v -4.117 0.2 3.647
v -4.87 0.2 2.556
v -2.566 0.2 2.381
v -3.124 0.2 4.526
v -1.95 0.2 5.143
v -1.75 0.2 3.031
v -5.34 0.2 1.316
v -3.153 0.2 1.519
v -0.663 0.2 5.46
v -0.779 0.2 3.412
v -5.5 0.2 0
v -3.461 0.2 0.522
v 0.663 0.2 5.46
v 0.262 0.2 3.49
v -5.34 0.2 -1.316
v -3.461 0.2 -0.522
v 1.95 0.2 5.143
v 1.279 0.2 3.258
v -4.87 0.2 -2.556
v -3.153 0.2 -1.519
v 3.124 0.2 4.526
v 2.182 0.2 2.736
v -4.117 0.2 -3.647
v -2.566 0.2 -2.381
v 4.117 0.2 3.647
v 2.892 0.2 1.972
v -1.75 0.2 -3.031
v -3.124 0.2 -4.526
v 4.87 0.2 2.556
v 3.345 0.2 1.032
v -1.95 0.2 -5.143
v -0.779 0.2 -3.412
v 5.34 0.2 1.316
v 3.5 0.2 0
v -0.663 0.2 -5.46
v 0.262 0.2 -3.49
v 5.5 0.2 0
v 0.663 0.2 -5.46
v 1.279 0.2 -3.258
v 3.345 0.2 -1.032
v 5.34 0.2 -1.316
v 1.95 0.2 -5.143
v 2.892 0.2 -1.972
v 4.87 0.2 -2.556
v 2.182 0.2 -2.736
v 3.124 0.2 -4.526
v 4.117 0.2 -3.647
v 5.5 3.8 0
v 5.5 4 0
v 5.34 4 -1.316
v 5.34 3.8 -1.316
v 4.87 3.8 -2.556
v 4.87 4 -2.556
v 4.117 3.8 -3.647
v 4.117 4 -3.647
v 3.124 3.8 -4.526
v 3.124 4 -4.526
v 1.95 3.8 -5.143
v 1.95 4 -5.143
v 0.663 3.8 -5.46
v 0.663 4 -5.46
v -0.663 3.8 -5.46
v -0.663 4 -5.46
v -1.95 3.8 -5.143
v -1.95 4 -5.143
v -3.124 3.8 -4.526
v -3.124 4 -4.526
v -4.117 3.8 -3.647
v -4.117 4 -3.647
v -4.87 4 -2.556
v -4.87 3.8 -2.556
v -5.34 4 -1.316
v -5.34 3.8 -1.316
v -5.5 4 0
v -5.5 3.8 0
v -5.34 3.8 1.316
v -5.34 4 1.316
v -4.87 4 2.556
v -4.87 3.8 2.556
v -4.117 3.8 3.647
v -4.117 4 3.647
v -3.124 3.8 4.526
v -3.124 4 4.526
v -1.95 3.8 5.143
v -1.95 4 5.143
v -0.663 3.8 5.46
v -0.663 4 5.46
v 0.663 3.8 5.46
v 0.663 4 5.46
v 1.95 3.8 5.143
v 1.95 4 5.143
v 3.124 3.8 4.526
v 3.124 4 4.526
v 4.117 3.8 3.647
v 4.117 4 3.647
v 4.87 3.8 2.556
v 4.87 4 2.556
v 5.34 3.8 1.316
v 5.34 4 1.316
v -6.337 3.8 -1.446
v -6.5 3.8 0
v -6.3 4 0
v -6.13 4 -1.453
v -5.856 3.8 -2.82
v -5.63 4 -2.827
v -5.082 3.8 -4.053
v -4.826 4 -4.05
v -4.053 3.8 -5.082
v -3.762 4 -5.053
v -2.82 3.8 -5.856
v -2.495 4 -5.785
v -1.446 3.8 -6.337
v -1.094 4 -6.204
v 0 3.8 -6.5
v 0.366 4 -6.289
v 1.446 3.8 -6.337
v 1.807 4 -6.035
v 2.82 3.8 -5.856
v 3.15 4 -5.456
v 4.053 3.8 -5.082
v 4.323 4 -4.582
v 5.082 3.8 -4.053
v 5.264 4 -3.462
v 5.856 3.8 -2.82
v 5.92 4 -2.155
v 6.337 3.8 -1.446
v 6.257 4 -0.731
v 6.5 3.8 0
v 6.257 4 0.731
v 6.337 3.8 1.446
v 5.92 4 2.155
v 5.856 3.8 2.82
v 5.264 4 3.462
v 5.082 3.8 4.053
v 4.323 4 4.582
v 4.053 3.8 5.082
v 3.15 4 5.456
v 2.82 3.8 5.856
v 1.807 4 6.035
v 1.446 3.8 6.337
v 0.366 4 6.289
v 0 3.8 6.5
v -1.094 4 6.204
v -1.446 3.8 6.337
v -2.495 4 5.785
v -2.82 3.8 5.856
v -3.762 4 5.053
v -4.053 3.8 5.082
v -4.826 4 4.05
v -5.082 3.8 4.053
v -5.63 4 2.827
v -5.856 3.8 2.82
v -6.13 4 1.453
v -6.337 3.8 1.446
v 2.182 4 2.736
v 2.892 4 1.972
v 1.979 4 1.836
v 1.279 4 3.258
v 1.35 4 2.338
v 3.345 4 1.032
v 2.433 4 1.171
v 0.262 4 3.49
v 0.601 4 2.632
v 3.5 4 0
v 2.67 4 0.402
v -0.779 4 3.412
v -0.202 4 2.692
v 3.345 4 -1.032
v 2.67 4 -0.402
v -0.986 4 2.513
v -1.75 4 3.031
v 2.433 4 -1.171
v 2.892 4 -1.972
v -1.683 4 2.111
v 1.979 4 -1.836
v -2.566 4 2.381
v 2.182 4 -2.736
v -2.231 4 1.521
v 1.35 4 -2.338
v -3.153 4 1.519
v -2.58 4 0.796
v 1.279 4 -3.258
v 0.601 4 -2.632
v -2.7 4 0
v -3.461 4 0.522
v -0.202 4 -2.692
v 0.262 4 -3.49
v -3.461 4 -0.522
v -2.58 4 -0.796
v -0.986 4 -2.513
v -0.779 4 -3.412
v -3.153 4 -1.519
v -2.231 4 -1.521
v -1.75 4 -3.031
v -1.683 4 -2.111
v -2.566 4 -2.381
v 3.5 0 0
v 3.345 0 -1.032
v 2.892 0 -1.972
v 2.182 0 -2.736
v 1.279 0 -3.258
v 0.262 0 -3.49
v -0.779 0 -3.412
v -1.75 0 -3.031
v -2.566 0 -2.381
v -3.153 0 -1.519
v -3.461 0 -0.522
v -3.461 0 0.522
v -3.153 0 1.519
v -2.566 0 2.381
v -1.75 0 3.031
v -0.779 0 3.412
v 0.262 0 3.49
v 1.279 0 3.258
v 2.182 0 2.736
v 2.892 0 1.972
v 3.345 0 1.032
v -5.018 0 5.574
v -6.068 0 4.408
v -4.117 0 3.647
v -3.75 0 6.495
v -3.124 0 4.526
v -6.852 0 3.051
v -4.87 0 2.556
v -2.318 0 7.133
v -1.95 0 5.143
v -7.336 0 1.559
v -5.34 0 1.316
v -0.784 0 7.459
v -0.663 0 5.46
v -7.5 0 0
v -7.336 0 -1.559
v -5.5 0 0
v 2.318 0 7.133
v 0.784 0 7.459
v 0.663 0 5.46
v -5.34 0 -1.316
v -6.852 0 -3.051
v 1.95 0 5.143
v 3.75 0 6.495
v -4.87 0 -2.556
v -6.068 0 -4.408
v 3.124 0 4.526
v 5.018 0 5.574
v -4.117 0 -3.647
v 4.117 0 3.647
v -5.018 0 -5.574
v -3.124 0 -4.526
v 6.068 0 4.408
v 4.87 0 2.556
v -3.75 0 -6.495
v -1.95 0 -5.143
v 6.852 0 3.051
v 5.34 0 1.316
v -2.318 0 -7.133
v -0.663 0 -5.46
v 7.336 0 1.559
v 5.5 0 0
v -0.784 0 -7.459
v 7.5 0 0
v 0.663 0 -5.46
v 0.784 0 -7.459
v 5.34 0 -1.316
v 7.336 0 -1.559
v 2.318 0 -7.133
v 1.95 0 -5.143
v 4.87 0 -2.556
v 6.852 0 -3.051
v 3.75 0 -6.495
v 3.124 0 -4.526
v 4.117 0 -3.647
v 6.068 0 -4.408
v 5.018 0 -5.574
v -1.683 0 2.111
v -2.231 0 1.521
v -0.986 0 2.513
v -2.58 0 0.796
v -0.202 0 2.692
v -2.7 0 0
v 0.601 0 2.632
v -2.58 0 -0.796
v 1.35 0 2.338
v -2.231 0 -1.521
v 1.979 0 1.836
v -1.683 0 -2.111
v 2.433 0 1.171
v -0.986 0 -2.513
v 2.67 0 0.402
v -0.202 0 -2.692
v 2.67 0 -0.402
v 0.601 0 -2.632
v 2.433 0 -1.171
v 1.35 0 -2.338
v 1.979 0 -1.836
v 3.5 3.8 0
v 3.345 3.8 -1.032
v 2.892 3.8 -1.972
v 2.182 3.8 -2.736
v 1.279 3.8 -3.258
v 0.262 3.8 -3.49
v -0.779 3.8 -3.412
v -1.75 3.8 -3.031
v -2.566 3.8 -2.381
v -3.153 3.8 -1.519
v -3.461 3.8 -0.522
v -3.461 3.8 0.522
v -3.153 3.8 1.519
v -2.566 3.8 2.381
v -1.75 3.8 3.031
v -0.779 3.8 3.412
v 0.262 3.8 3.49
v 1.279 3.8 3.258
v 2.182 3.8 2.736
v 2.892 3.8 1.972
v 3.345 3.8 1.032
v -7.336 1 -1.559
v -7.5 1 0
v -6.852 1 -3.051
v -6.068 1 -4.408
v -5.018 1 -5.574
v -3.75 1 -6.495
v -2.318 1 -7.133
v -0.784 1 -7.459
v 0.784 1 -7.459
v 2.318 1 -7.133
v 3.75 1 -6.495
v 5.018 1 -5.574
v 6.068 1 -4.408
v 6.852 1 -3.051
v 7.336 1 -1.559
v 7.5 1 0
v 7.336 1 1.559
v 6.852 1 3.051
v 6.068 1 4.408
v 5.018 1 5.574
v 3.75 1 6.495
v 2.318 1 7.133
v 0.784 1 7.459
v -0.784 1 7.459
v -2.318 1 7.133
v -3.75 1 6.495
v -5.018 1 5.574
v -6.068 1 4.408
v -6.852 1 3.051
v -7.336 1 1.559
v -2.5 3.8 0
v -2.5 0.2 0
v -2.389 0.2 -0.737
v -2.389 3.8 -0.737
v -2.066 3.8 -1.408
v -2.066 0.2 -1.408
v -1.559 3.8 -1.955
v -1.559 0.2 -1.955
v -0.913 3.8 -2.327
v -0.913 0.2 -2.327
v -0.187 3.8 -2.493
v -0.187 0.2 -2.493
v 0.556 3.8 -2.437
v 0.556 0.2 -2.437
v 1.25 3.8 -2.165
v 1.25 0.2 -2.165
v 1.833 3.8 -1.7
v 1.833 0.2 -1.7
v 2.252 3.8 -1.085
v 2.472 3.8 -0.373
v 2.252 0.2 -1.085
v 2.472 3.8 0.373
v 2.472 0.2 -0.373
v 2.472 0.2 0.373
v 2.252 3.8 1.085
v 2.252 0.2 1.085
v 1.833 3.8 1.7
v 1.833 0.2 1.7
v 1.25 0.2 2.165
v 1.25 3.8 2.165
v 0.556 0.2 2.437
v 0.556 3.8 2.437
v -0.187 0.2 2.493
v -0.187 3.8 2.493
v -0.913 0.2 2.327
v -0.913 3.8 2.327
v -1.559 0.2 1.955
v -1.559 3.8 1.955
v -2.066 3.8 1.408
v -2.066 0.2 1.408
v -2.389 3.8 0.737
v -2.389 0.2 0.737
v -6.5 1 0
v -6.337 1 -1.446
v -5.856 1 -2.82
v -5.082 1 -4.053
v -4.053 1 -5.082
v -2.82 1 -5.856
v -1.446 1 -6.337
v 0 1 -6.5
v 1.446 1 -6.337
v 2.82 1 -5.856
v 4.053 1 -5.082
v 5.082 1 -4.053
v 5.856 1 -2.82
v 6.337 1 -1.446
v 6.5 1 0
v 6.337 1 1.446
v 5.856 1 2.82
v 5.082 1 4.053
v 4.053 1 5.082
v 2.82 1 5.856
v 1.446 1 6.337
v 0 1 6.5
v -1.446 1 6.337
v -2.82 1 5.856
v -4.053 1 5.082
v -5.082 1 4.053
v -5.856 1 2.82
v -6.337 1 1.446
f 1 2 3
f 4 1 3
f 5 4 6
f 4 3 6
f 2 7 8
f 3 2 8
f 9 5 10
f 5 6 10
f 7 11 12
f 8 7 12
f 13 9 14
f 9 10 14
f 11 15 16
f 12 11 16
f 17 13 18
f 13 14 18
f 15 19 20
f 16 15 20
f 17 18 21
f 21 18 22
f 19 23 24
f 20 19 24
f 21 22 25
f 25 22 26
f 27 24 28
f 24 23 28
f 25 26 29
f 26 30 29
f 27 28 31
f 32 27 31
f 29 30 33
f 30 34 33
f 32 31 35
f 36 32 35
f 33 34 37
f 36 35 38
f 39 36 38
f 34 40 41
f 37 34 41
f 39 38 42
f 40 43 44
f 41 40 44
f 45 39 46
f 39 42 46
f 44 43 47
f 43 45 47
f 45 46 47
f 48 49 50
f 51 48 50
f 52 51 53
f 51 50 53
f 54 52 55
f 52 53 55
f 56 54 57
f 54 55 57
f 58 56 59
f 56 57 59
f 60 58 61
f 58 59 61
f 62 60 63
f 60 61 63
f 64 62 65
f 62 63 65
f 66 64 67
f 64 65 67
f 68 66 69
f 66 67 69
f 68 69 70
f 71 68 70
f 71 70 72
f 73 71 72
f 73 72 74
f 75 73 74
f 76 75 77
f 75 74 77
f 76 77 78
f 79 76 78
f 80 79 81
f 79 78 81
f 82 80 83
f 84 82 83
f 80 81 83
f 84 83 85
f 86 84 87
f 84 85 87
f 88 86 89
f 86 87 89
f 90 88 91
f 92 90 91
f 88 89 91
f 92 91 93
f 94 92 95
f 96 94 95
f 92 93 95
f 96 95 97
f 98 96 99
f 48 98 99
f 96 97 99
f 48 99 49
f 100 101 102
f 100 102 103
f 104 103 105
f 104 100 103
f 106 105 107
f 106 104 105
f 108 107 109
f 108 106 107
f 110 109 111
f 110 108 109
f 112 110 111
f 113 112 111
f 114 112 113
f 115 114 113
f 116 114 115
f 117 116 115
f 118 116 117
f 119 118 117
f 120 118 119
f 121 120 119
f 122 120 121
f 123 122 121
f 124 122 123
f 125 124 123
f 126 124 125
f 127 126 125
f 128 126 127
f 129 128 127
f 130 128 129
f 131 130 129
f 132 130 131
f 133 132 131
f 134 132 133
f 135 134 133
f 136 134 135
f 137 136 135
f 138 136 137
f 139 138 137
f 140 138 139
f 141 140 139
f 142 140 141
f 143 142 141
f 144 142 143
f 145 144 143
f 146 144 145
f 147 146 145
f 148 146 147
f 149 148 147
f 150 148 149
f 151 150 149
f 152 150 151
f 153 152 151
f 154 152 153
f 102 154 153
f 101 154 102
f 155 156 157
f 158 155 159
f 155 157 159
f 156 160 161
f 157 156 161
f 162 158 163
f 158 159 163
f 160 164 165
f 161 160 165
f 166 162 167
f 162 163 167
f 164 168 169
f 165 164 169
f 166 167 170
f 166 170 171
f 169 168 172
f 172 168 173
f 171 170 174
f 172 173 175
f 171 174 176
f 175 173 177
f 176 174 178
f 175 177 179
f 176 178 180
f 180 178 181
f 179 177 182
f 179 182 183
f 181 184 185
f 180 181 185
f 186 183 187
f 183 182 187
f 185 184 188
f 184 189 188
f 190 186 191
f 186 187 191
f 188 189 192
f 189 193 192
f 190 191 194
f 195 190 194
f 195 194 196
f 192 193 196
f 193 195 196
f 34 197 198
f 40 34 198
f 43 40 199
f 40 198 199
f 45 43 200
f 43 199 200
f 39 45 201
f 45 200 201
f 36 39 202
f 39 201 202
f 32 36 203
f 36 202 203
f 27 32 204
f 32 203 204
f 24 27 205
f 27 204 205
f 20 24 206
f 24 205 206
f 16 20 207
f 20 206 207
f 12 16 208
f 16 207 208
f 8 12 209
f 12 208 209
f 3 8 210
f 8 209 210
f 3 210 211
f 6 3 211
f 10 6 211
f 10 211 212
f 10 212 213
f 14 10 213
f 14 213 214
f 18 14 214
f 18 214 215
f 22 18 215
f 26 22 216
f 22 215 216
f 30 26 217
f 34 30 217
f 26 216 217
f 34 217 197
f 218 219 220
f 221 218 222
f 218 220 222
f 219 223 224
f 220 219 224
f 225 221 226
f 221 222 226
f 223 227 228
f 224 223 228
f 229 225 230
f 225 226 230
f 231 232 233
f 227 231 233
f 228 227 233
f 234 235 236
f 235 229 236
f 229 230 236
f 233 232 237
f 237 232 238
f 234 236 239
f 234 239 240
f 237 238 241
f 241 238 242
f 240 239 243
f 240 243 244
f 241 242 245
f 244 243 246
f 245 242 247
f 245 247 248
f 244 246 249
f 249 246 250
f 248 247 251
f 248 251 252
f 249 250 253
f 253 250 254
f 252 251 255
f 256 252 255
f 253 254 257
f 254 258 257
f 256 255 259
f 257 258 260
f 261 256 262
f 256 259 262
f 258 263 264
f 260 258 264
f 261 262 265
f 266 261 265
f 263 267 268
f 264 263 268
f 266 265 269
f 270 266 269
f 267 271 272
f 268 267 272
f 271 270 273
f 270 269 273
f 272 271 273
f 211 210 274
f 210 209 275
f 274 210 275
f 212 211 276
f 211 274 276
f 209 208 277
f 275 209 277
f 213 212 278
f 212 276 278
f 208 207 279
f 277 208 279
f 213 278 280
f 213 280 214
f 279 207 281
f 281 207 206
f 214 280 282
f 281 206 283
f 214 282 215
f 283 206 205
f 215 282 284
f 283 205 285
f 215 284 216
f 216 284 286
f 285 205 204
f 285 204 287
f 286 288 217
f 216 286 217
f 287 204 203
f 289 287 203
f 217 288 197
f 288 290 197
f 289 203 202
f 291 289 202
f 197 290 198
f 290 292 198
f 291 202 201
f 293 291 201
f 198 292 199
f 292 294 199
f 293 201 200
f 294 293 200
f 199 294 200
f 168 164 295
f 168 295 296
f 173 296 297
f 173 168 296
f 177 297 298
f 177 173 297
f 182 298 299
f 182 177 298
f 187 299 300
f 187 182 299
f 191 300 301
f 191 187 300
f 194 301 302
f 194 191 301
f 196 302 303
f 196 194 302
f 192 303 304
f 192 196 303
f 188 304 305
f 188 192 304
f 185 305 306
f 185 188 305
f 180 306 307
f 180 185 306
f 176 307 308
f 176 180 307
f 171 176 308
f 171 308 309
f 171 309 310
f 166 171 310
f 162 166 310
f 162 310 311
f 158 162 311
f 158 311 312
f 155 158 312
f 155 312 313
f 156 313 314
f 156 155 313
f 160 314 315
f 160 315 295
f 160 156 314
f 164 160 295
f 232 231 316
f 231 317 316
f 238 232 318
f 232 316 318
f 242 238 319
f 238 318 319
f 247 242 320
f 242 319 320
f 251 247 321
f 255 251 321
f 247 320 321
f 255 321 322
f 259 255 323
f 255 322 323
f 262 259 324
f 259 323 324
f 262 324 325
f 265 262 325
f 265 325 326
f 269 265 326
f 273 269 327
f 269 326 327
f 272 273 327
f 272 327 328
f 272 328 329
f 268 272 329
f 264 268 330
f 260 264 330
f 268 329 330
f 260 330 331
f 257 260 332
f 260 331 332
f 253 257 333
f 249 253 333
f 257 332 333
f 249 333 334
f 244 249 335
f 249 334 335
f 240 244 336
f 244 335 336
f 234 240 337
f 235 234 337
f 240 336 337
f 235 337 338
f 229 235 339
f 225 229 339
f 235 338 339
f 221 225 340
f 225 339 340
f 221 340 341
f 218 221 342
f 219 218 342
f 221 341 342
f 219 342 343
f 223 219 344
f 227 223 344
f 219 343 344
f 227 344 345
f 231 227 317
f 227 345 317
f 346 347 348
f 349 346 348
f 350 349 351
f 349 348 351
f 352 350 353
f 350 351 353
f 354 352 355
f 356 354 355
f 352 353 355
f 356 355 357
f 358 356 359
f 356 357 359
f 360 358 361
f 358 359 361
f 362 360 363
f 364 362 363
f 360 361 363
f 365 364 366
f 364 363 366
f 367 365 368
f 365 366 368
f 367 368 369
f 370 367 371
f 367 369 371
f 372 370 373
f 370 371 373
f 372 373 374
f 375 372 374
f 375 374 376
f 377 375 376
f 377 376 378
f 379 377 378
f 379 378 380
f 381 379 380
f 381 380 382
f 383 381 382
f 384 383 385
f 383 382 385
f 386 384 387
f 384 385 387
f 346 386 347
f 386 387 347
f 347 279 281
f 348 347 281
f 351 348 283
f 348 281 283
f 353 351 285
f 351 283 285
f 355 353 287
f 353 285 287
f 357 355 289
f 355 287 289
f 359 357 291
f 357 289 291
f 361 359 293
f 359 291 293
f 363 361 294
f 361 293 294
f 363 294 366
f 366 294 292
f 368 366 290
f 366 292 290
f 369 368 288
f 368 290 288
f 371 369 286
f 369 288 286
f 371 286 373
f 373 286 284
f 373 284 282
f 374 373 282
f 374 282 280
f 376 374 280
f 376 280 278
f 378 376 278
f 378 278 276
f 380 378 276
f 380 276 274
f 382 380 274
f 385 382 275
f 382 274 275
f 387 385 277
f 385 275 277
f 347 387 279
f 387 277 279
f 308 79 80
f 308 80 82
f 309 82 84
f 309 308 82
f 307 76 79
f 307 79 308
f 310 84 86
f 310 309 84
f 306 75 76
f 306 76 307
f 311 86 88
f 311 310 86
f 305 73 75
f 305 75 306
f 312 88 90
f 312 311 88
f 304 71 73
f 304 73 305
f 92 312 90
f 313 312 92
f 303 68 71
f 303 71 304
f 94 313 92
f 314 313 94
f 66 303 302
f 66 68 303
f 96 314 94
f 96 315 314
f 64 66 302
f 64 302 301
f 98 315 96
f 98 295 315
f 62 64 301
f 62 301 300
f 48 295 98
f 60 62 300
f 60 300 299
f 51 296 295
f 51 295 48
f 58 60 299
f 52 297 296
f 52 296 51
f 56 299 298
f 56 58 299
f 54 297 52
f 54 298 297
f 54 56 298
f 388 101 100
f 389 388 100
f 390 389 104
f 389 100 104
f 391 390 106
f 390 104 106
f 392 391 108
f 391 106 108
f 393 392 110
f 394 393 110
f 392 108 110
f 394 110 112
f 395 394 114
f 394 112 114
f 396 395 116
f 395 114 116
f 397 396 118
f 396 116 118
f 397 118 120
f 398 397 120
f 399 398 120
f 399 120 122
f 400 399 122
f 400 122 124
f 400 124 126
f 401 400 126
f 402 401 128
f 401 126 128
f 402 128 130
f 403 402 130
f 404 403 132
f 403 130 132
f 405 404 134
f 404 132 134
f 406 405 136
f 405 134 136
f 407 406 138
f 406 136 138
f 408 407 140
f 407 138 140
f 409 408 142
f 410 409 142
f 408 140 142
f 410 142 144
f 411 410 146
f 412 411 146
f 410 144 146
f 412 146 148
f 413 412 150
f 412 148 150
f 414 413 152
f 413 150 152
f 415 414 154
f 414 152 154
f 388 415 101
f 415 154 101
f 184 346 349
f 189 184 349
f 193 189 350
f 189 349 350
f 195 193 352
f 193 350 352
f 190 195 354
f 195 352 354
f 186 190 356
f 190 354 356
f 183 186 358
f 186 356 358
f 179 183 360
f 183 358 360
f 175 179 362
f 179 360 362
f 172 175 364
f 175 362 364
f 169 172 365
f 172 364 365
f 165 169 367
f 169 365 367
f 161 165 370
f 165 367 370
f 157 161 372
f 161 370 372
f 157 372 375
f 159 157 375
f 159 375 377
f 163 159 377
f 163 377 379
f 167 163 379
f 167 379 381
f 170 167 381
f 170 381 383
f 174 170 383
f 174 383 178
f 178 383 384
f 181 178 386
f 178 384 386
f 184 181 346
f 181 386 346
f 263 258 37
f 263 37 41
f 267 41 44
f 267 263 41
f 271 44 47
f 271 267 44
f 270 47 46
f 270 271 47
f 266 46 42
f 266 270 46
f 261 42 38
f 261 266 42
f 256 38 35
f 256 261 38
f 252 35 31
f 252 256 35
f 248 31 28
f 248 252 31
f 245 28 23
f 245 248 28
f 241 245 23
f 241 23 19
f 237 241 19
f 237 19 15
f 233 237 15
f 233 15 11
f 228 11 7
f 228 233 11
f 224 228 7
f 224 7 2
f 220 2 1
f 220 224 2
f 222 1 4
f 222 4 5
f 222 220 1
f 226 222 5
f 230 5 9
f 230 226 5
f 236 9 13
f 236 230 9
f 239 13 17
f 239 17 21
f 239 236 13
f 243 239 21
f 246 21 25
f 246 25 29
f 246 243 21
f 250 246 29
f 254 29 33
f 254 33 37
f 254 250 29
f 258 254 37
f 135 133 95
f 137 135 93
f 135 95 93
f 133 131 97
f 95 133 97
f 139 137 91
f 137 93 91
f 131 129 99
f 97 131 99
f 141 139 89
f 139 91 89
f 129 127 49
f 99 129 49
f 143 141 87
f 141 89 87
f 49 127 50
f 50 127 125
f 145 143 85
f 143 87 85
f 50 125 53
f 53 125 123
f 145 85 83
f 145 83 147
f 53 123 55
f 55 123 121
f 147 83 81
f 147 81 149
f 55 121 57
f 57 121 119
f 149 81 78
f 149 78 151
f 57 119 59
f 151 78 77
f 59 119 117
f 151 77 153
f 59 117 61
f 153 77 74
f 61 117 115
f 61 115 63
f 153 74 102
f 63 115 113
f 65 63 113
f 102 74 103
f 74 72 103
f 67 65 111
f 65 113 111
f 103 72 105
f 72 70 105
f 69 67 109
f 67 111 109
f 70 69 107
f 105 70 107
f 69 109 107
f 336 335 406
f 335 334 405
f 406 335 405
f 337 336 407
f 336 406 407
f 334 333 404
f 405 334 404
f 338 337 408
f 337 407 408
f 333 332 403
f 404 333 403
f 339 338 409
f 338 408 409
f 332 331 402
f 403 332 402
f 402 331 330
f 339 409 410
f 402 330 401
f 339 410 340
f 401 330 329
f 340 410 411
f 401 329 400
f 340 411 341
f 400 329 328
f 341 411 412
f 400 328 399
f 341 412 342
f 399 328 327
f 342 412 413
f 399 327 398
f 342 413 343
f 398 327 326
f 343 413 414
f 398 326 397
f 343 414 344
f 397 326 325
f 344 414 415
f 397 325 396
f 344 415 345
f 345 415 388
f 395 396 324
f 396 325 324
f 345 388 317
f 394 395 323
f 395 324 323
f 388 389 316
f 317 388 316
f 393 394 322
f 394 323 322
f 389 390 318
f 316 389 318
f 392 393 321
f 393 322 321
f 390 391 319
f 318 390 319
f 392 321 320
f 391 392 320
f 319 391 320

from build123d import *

# Parameters (mm, degrees)
SKETCH3_R          = 5.5
SKETCH3_R_2        = 3.5
CUT_EXTRUDE1_DEPTH = 0.2
CHAMFER1_SIZE      = 0.2


with BuildPart() as part:
    # Sketch2 → Revolve1 (revolve)
    with BuildSketch(Plane.XY):
        Polygon((-6.5, 4), (-2.5, 4), (-2.5, 0), (-7.5, 0), (-7.5, 1), (-6.5, 1), align=None)
    revolve(axis=Axis((0, 1.921623867, 0), (0, -1, 0)))

    # Sketch3 → Cut-Extrude1 (cut)
    with BuildSketch(Plane(origin=(0, 4, 0), x_dir=(1, 0, 0), z_dir=(0, 1, 0))):
        Circle(SKETCH3_R)
        Circle(SKETCH3_R_2, mode=Mode.SUBTRACT)
    cut_extrude1 = extrude(amount=-CUT_EXTRUDE1_DEPTH, mode=Mode.SUBTRACT)

    # Mirror1: Cut-Extrude1 across plane
    add(cut_extrude1.mirror(Plane.ZX.offset(2)), mode=Mode.SUBTRACT)

    # Chamfer1
    chamfer1_edges = [part.edges().sort_by_distance(p)[0] for p in [
        (2.5, 0, 0),
        (2.5, 4, 0),
        (6.5, 4, 0),
    ]]
    chamfer(chamfer1_edges, length=CHAMFER1_SIZE)


solid = part.part
